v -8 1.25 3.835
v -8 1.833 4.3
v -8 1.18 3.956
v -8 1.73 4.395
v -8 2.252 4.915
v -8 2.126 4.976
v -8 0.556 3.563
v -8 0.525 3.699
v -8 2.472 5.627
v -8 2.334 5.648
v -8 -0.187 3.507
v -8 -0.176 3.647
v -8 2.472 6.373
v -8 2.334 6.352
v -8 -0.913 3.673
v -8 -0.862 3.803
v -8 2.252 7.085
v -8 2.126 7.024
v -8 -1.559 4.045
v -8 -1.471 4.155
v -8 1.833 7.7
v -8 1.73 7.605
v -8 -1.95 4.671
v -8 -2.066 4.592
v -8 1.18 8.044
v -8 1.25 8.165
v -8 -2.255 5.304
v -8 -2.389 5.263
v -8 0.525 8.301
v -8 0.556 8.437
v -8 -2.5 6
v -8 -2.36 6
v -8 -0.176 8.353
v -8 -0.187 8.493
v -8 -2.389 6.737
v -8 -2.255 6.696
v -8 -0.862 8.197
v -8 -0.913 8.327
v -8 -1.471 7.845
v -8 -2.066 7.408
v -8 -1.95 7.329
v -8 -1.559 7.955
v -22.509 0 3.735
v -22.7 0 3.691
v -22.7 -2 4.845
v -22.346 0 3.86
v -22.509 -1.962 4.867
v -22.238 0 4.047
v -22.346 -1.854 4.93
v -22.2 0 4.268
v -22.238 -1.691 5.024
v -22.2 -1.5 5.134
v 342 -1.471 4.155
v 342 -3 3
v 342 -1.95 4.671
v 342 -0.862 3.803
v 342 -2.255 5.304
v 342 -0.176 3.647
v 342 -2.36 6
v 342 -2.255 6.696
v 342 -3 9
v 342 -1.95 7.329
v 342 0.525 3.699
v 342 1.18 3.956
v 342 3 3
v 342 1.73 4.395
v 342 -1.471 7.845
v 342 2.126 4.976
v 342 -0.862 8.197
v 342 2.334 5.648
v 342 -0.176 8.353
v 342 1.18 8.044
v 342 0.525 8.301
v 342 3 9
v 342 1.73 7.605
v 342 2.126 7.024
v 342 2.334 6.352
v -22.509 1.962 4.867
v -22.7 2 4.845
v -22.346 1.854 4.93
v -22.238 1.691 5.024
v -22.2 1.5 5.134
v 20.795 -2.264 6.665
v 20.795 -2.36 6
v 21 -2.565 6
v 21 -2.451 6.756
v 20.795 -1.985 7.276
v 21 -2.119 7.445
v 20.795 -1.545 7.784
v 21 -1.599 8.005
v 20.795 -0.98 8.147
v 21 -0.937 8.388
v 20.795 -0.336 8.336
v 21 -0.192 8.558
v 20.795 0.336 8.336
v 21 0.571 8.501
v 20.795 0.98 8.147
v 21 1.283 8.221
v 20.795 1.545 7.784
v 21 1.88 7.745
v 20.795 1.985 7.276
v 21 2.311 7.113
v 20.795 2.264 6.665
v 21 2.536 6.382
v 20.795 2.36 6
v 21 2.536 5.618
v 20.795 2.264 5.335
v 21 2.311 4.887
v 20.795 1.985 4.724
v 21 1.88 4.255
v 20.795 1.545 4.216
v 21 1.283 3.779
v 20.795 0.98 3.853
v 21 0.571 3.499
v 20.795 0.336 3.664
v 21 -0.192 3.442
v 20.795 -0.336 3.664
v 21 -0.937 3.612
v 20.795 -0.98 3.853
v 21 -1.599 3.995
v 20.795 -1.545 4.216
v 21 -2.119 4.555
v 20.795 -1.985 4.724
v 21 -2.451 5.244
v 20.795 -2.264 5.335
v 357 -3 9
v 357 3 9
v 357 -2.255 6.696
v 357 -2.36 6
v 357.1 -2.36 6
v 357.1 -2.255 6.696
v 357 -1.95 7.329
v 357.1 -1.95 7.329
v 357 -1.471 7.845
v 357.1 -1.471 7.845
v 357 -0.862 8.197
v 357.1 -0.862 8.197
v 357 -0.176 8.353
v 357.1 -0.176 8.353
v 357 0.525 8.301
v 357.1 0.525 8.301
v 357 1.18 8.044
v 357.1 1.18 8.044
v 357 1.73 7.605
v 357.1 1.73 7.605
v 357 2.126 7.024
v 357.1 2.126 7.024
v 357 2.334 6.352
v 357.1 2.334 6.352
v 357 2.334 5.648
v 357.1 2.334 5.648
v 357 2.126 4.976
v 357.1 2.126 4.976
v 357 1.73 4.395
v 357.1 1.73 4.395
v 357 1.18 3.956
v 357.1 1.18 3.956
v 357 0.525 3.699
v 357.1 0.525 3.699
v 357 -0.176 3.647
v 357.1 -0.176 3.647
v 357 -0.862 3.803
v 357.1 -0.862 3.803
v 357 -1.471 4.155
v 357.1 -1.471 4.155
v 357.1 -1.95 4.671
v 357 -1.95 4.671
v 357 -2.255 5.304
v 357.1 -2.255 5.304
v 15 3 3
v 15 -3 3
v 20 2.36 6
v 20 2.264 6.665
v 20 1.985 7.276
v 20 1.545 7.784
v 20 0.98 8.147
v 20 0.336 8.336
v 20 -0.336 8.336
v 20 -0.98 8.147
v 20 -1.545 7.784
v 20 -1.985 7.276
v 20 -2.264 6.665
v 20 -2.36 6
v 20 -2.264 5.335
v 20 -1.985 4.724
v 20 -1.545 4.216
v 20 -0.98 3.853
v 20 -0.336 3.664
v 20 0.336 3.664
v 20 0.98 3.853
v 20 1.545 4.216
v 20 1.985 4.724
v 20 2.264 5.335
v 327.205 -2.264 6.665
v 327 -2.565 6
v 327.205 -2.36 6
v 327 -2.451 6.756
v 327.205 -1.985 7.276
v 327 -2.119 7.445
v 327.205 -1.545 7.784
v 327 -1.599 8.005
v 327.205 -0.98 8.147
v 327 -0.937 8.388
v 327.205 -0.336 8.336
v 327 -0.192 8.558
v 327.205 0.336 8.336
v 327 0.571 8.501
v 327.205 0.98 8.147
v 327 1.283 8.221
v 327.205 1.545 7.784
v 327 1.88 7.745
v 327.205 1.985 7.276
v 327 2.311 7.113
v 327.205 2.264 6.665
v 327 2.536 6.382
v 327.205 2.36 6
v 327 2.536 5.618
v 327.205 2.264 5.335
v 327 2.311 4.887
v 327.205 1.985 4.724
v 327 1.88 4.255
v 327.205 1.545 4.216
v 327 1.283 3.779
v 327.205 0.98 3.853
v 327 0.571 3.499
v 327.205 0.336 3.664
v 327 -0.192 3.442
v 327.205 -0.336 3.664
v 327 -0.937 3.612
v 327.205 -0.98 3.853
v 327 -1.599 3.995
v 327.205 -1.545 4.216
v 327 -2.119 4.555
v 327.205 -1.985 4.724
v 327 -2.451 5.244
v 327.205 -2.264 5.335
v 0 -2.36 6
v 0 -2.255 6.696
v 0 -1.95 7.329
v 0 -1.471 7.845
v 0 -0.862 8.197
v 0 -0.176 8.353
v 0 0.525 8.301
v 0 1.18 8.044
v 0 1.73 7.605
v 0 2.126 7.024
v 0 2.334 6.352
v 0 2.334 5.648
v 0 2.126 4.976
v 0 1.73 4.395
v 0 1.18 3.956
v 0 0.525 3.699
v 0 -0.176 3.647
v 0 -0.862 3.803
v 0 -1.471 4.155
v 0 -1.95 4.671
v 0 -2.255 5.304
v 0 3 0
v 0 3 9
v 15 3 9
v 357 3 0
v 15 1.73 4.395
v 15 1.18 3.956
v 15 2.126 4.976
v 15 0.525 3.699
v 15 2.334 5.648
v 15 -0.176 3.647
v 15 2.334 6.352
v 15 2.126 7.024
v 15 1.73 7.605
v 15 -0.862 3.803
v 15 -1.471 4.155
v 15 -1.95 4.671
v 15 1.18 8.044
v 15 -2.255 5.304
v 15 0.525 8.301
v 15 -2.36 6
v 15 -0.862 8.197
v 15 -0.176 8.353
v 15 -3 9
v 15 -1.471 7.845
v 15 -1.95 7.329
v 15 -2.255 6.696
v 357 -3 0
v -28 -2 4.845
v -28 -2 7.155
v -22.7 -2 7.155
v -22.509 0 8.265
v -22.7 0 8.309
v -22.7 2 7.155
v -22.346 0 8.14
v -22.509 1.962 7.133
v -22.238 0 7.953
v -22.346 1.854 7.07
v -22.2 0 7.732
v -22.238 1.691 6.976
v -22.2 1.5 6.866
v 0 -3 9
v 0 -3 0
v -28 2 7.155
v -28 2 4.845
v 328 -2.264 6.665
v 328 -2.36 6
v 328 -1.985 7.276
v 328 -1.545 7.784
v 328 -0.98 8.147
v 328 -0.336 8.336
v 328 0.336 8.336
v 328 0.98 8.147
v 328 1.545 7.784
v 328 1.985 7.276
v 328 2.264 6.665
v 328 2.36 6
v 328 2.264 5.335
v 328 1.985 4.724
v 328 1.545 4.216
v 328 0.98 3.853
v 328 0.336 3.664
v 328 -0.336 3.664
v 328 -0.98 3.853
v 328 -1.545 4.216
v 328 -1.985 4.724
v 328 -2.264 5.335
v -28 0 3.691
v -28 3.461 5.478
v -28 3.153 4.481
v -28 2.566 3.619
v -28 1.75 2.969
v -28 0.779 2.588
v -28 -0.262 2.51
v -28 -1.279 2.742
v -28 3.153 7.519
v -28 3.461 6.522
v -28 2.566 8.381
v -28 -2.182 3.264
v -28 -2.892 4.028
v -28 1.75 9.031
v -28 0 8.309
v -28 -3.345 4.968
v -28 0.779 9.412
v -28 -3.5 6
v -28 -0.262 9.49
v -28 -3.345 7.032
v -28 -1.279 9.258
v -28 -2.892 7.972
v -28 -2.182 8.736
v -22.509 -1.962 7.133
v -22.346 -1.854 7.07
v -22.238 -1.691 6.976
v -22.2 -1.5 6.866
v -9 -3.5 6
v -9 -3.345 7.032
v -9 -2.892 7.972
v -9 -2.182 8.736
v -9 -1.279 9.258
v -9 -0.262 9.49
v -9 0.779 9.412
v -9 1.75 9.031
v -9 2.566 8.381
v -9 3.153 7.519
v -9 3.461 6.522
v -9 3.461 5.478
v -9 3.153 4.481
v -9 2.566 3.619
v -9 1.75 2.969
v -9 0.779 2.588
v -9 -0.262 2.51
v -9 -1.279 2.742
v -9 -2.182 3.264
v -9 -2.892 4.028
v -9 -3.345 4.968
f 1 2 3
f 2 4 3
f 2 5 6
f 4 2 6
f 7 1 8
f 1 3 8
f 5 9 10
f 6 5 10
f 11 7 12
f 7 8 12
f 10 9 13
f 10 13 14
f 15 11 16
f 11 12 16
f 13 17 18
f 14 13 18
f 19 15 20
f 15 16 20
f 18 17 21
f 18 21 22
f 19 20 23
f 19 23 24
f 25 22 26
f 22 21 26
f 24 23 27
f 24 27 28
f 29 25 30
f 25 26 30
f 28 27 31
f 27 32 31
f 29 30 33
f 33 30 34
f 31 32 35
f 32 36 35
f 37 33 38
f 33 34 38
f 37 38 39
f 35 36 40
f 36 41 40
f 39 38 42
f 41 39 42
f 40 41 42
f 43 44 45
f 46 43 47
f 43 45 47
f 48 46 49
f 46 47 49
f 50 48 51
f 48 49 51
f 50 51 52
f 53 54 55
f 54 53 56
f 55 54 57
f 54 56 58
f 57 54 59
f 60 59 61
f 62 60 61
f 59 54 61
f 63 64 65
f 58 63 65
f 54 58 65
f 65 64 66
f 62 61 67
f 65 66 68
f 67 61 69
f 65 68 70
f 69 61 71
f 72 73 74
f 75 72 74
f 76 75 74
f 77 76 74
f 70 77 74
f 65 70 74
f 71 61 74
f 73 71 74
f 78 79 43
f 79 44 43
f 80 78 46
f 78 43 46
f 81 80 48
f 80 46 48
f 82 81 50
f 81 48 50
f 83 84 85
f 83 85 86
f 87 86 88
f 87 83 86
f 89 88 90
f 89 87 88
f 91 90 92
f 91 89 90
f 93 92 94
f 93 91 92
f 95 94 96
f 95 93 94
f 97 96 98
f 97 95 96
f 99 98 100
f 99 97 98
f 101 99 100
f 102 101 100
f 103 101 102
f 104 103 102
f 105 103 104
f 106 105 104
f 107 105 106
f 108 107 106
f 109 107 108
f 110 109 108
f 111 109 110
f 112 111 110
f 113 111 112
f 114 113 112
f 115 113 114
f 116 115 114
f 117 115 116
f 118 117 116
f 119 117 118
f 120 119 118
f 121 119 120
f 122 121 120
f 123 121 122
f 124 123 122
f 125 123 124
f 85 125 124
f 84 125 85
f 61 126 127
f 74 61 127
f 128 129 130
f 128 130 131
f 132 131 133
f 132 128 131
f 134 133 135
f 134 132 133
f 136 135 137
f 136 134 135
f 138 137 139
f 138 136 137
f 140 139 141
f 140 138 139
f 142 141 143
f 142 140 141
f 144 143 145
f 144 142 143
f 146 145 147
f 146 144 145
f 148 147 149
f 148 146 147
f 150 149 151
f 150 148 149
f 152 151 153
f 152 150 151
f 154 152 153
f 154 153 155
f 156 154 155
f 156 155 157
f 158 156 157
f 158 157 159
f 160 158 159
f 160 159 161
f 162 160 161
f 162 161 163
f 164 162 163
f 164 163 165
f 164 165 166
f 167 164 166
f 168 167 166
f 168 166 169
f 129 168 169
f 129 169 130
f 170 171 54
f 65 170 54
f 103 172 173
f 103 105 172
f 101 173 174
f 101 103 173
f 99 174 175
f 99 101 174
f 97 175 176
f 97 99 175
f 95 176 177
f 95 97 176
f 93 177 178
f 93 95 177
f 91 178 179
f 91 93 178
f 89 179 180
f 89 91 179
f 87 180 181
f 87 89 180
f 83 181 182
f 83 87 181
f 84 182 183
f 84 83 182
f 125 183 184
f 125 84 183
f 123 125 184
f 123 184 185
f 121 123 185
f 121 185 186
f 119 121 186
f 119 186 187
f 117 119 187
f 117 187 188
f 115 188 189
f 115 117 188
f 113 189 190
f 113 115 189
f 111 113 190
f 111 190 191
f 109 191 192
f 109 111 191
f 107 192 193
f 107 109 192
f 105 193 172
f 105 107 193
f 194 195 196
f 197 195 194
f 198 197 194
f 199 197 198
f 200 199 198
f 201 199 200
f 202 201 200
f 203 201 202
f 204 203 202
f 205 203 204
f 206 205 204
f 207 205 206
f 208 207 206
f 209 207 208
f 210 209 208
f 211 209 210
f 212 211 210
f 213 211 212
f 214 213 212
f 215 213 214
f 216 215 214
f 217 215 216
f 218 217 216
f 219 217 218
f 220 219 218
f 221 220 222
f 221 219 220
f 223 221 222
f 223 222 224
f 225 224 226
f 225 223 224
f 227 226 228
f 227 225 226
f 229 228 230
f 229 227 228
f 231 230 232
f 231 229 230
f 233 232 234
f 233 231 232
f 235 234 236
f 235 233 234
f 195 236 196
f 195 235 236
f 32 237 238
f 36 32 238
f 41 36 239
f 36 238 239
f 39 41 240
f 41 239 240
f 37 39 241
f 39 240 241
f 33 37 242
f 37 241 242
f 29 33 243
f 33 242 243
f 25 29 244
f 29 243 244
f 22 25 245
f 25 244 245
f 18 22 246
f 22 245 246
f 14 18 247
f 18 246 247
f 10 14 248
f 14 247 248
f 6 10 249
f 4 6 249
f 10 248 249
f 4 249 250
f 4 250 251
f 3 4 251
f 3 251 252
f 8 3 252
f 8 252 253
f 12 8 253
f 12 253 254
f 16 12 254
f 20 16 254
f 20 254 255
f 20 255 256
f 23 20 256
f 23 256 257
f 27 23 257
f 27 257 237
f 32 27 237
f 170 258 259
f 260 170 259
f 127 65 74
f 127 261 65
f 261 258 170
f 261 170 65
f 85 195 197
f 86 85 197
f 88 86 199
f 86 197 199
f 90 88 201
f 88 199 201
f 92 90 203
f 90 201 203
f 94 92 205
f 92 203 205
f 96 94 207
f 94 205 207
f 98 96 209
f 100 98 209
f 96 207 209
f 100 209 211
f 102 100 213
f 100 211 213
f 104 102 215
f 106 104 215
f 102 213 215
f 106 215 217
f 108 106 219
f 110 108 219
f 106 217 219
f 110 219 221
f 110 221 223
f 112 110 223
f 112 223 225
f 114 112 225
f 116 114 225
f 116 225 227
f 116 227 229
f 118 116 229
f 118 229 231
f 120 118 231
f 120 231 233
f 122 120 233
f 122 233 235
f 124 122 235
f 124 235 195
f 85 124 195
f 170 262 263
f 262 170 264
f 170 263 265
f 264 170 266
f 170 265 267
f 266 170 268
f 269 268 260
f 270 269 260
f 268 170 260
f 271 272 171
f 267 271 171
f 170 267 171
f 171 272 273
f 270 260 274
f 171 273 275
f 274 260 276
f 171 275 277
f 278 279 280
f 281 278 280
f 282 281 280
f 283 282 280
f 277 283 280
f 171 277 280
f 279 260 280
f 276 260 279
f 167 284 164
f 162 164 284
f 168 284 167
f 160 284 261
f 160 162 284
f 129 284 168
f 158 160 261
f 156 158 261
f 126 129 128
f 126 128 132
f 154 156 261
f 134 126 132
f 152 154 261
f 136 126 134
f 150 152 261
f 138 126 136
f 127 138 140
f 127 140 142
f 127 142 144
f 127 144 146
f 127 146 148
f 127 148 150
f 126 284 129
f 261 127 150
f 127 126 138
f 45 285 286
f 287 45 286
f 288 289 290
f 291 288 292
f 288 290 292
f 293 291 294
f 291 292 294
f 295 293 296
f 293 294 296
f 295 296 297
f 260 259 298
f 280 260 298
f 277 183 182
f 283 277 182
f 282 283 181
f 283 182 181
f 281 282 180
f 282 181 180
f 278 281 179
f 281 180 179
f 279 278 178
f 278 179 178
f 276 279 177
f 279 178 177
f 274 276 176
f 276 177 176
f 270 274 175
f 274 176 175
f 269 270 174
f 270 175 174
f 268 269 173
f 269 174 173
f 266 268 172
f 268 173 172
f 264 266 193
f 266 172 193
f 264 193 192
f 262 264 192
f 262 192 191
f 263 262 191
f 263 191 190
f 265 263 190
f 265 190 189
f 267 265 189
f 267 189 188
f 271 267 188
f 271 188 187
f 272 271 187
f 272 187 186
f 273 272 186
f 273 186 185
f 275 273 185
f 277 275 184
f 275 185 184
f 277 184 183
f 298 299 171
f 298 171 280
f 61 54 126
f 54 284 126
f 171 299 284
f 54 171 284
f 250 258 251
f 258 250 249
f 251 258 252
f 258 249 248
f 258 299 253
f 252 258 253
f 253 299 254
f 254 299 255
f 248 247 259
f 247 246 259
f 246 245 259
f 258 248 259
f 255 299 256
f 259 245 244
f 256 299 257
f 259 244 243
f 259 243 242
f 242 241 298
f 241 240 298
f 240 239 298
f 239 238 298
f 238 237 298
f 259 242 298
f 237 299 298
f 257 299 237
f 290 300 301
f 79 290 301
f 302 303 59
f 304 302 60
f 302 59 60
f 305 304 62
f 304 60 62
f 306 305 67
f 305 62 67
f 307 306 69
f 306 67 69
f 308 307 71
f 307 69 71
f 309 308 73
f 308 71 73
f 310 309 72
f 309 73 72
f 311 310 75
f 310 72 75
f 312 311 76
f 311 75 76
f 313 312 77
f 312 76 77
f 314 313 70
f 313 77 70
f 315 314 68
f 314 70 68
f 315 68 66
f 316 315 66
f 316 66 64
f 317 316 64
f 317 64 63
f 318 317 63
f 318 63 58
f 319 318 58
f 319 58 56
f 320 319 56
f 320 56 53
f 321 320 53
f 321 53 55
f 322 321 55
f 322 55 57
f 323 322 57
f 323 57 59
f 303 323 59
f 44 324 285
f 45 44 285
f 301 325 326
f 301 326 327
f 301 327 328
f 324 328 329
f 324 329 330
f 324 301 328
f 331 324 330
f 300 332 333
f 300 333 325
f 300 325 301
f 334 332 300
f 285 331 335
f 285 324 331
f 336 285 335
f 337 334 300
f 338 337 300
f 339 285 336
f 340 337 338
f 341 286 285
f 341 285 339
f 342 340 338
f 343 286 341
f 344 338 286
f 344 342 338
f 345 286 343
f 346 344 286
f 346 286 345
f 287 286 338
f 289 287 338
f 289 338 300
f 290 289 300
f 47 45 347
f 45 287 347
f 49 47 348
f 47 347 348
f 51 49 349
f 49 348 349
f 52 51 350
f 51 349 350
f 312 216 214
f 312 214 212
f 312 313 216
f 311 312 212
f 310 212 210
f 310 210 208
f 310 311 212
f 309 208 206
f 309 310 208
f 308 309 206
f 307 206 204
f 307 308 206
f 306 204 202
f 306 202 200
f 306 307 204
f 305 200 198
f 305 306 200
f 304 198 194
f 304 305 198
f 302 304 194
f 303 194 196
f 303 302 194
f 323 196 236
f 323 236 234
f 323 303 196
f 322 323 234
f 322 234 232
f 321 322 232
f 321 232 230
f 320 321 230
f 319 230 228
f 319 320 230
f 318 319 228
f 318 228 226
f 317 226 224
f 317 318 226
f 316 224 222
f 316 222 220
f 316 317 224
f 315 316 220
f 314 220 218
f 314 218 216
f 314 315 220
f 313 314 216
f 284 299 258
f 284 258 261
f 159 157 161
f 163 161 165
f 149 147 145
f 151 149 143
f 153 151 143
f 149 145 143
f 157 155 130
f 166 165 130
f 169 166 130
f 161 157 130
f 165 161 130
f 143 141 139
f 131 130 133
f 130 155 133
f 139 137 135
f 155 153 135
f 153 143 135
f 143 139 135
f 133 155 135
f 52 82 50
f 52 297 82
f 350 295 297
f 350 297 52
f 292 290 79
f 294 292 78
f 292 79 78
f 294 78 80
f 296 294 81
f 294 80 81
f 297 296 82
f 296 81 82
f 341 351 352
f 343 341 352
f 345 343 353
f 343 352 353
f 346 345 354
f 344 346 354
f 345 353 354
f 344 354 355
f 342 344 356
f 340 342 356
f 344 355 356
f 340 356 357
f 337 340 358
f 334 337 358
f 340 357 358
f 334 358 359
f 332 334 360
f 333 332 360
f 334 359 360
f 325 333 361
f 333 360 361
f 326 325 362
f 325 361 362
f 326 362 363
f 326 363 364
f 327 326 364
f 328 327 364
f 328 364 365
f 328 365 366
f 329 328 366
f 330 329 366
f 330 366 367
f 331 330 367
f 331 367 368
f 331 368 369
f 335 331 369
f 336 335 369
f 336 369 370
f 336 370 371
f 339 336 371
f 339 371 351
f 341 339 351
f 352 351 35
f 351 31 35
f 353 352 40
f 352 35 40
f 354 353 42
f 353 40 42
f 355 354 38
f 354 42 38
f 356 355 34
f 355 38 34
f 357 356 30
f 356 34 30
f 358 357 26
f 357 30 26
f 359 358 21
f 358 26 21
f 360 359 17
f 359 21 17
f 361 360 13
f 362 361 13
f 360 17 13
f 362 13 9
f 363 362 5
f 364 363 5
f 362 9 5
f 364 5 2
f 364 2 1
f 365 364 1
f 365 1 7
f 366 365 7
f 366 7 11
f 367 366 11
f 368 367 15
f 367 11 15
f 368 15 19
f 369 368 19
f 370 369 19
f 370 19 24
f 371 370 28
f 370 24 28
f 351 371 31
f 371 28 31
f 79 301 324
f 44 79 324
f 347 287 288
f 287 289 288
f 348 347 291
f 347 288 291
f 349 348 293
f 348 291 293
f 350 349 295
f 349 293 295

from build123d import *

# Parameters (mm, degrees)
F0_W            = 357
F0_H            = 3
F1_DEPTH        = 3
F2_W            = 6
F2_H            = 6
F3_DEPTH        = 15
F4_W            = 6
F4_H            = 6
F5_DEPTH        = 15
F6_R            = 2.36
F7_DEPTH        = 14
F8_R            = 2.565
F9_DEPTH        = 308
F10_R           = 2.36
F11_DEPTH       = 28
F12_DEPTH       = 15.1
F13_R           = 3.5
F14_DEPTH       = 20
F15_2_S5_R      = 2.36
F15_2_T6_DEPTH  = 5
F15_2_S11_R     = 2.36
F15_2_T12_DEPTH = 5
F17_DEPTH       = 5.8
F18_R           = 0.5


# Not quite as in the source:
# - a fillet or chamfer that OpenCascade refuses, or shapes differently, is made with other operations: its cross-section is extruded or revolved along the edge and cut away or added


with BuildPart() as f1:
    # F0 (on Front) → F1 (new body, symmetric)
    with BuildSketch(Plane.XZ):
        with Locations((178.5, 1.5)):
            Rectangle(F0_W, F0_H)
    extrude(amount=F1_DEPTH, both=True)


with BuildPart() as f3:
    # F2 (on face) → F3 (new body)
    with BuildSketch(Plane.YZ.offset(357)):
        with Locations((0, 6)):
            Rectangle(F2_W, F2_H)
    extrude(amount=-F3_DEPTH)



with BuildPart() as f5:
    # F4 (on face) → F5 (new body)
    with BuildSketch(Plane(origin=(0, 0, 0), x_dir=(0, -1, 0), z_dir=(-1, 0, 0))):
        with Locations((0, 6)):
            Rectangle(F4_W, F4_H)
    extrude(amount=-F5_DEPTH)



with BuildPart() as f7:
    # F6 (on face) → F7 (new body)
    with BuildSketch(Plane(origin=(342, 0, 0), x_dir=(0, -1, 0), z_dir=(-1, 0, 0))):
        with Locations((0, 6)):
            Circle(F6_R)
    extrude(amount=F7_DEPTH)

    # F8 (on face) → F9 (join)
    with BuildSketch(Plane(origin=(328, 0, 0), x_dir=(0, -1, 0), z_dir=(-1, 0, 0))):
        with Locations((0, 6)):
            Circle(F8_R)
    extrude(amount=F9_DEPTH)


with BuildPart() as f5_1:
    add(f5.part)

    add(f7.part)  # F11 merges F7
    # F10 (on face) → F11 (join)
    with BuildSketch(Plane(origin=(20, 0, 0), x_dir=(0, -1, 0), z_dir=(-1, 0, 0))):
        with Locations((0, 6)):
            Circle(F10_R)
    extrude(amount=F11_DEPTH)


with BuildPart() as f3_1:
    add(f3.part)

    add(f5_1.part)  # F12 merges F5
    # F6 (on face) → F12 (join)
    with BuildSketch(Plane(origin=(342, 0, 0), x_dir=(0, -1, 0), z_dir=(-1, 0, 0))):
        with Locations((0, 6)):
            Circle(F6_R)
    extrude(amount=-F12_DEPTH)

    # F15#2: chamfer of 1 on 2 edges, made by hand


with BuildPart() as f14:
    # F13 (on face) → F14 (new body)
    with BuildSketch(Plane(origin=(-8, 0, 0), x_dir=(0, -1, 0), z_dir=(-1, 0, 0))):
        with Locations((0, 6)):
            Circle(F13_R)
    extrude(amount=F14_DEPTH)

    # F15: chamfer of 1 on 1 edges, made by hand

    # F15_s1 → F15_t2 (revolve, cut)
    with BuildSketch(Plane.XY.offset(6)):
        Polygon((-9, -3.5), (-8, -2.5), (-8, -3.5), align=None)
    revolve(axis=Axis((-8, 0, 6), (-1, 0, 0)), mode=Mode.SUBTRACT)

    # F16 (on face) → F17 (cut)
    with BuildSketch(Plane(origin=(-28, 0, 0), x_dir=(0, -1, 0), z_dir=(-1, 0, 0))):
        Polygon((0, 3.6905989232), (2, 4.8452994616), (2, 7.1547005384), (0, 8.3094010768), (-2, 7.1547005384), (-2, 4.8452994616), align=None)
    extrude(amount=-F17_DEPTH, mode=Mode.SUBTRACT)

    # F18
    f18_edges = [f14.edges().sort_by_distance(p)[0] for p in [
        (-22.2, 1, 4.267949),
        (-22.2, -1, 4.267949),
        (-22.2, -2, 6),
        (-22.2, -1, 7.732051),
        (-22.2, 1, 7.732051),
        (-22.2, 2, 6),
    ]]
    fillet(f18_edges, radius=F18_R)


with BuildPart() as f15_2_tool2:
    # F15_2_s3 → F15_2_t4 (revolve)
    with BuildSketch(Plane.XY.offset(6)):
        Polygon((21, -2.565), (20, -1.565), (20, -2.565), align=None)
    revolve(axis=Axis((20, 0, 6), (-1, 0, 0)))

    # F15_2_s5 → F15_2_t6 (cut, symmetric)
    with BuildSketch(Plane.YZ.offset(20.5)):
        with Locations((0, 6)):
            Circle(F15_2_S5_R)
    extrude(amount=F15_2_T6_DEPTH, both=True, mode=Mode.SUBTRACT)


with BuildPart() as f3_2:
    add(f3_1.part)

    # F15_2_t1: cut F15_2_tool2
    add(f15_2_tool2.part, mode=Mode.SUBTRACT)


with BuildPart() as f15_2_tool8:
    # F15_2_s9 → F15_2_t10 (revolve)
    with BuildSketch(Plane.XY.offset(6)):
        Polygon((328, -1.565), (327, -2.565), (328, -2.565), align=None)
    revolve(axis=Axis((328, 0, 6), (-1, 0, 0)))

    # F15_2_s11 → F15_2_t12 (cut, symmetric)
    with BuildSketch(Plane.YZ.offset(327.5)):
        with Locations((0, 6)):
            Circle(F15_2_S11_R)
    extrude(amount=F15_2_T12_DEPTH, both=True, mode=Mode.SUBTRACT)


with BuildPart() as f3_3:
    add(f3_2.part)

    # F15_2_t7: cut F15_2_tool8
    add(f15_2_tool8.part, mode=Mode.SUBTRACT)


with BuildPart() as f1_1:
    add(f1.part)

    # F19: union F3, F14
    add(f3_3.part)
    add(f14.part)


solid = f1_1.part
